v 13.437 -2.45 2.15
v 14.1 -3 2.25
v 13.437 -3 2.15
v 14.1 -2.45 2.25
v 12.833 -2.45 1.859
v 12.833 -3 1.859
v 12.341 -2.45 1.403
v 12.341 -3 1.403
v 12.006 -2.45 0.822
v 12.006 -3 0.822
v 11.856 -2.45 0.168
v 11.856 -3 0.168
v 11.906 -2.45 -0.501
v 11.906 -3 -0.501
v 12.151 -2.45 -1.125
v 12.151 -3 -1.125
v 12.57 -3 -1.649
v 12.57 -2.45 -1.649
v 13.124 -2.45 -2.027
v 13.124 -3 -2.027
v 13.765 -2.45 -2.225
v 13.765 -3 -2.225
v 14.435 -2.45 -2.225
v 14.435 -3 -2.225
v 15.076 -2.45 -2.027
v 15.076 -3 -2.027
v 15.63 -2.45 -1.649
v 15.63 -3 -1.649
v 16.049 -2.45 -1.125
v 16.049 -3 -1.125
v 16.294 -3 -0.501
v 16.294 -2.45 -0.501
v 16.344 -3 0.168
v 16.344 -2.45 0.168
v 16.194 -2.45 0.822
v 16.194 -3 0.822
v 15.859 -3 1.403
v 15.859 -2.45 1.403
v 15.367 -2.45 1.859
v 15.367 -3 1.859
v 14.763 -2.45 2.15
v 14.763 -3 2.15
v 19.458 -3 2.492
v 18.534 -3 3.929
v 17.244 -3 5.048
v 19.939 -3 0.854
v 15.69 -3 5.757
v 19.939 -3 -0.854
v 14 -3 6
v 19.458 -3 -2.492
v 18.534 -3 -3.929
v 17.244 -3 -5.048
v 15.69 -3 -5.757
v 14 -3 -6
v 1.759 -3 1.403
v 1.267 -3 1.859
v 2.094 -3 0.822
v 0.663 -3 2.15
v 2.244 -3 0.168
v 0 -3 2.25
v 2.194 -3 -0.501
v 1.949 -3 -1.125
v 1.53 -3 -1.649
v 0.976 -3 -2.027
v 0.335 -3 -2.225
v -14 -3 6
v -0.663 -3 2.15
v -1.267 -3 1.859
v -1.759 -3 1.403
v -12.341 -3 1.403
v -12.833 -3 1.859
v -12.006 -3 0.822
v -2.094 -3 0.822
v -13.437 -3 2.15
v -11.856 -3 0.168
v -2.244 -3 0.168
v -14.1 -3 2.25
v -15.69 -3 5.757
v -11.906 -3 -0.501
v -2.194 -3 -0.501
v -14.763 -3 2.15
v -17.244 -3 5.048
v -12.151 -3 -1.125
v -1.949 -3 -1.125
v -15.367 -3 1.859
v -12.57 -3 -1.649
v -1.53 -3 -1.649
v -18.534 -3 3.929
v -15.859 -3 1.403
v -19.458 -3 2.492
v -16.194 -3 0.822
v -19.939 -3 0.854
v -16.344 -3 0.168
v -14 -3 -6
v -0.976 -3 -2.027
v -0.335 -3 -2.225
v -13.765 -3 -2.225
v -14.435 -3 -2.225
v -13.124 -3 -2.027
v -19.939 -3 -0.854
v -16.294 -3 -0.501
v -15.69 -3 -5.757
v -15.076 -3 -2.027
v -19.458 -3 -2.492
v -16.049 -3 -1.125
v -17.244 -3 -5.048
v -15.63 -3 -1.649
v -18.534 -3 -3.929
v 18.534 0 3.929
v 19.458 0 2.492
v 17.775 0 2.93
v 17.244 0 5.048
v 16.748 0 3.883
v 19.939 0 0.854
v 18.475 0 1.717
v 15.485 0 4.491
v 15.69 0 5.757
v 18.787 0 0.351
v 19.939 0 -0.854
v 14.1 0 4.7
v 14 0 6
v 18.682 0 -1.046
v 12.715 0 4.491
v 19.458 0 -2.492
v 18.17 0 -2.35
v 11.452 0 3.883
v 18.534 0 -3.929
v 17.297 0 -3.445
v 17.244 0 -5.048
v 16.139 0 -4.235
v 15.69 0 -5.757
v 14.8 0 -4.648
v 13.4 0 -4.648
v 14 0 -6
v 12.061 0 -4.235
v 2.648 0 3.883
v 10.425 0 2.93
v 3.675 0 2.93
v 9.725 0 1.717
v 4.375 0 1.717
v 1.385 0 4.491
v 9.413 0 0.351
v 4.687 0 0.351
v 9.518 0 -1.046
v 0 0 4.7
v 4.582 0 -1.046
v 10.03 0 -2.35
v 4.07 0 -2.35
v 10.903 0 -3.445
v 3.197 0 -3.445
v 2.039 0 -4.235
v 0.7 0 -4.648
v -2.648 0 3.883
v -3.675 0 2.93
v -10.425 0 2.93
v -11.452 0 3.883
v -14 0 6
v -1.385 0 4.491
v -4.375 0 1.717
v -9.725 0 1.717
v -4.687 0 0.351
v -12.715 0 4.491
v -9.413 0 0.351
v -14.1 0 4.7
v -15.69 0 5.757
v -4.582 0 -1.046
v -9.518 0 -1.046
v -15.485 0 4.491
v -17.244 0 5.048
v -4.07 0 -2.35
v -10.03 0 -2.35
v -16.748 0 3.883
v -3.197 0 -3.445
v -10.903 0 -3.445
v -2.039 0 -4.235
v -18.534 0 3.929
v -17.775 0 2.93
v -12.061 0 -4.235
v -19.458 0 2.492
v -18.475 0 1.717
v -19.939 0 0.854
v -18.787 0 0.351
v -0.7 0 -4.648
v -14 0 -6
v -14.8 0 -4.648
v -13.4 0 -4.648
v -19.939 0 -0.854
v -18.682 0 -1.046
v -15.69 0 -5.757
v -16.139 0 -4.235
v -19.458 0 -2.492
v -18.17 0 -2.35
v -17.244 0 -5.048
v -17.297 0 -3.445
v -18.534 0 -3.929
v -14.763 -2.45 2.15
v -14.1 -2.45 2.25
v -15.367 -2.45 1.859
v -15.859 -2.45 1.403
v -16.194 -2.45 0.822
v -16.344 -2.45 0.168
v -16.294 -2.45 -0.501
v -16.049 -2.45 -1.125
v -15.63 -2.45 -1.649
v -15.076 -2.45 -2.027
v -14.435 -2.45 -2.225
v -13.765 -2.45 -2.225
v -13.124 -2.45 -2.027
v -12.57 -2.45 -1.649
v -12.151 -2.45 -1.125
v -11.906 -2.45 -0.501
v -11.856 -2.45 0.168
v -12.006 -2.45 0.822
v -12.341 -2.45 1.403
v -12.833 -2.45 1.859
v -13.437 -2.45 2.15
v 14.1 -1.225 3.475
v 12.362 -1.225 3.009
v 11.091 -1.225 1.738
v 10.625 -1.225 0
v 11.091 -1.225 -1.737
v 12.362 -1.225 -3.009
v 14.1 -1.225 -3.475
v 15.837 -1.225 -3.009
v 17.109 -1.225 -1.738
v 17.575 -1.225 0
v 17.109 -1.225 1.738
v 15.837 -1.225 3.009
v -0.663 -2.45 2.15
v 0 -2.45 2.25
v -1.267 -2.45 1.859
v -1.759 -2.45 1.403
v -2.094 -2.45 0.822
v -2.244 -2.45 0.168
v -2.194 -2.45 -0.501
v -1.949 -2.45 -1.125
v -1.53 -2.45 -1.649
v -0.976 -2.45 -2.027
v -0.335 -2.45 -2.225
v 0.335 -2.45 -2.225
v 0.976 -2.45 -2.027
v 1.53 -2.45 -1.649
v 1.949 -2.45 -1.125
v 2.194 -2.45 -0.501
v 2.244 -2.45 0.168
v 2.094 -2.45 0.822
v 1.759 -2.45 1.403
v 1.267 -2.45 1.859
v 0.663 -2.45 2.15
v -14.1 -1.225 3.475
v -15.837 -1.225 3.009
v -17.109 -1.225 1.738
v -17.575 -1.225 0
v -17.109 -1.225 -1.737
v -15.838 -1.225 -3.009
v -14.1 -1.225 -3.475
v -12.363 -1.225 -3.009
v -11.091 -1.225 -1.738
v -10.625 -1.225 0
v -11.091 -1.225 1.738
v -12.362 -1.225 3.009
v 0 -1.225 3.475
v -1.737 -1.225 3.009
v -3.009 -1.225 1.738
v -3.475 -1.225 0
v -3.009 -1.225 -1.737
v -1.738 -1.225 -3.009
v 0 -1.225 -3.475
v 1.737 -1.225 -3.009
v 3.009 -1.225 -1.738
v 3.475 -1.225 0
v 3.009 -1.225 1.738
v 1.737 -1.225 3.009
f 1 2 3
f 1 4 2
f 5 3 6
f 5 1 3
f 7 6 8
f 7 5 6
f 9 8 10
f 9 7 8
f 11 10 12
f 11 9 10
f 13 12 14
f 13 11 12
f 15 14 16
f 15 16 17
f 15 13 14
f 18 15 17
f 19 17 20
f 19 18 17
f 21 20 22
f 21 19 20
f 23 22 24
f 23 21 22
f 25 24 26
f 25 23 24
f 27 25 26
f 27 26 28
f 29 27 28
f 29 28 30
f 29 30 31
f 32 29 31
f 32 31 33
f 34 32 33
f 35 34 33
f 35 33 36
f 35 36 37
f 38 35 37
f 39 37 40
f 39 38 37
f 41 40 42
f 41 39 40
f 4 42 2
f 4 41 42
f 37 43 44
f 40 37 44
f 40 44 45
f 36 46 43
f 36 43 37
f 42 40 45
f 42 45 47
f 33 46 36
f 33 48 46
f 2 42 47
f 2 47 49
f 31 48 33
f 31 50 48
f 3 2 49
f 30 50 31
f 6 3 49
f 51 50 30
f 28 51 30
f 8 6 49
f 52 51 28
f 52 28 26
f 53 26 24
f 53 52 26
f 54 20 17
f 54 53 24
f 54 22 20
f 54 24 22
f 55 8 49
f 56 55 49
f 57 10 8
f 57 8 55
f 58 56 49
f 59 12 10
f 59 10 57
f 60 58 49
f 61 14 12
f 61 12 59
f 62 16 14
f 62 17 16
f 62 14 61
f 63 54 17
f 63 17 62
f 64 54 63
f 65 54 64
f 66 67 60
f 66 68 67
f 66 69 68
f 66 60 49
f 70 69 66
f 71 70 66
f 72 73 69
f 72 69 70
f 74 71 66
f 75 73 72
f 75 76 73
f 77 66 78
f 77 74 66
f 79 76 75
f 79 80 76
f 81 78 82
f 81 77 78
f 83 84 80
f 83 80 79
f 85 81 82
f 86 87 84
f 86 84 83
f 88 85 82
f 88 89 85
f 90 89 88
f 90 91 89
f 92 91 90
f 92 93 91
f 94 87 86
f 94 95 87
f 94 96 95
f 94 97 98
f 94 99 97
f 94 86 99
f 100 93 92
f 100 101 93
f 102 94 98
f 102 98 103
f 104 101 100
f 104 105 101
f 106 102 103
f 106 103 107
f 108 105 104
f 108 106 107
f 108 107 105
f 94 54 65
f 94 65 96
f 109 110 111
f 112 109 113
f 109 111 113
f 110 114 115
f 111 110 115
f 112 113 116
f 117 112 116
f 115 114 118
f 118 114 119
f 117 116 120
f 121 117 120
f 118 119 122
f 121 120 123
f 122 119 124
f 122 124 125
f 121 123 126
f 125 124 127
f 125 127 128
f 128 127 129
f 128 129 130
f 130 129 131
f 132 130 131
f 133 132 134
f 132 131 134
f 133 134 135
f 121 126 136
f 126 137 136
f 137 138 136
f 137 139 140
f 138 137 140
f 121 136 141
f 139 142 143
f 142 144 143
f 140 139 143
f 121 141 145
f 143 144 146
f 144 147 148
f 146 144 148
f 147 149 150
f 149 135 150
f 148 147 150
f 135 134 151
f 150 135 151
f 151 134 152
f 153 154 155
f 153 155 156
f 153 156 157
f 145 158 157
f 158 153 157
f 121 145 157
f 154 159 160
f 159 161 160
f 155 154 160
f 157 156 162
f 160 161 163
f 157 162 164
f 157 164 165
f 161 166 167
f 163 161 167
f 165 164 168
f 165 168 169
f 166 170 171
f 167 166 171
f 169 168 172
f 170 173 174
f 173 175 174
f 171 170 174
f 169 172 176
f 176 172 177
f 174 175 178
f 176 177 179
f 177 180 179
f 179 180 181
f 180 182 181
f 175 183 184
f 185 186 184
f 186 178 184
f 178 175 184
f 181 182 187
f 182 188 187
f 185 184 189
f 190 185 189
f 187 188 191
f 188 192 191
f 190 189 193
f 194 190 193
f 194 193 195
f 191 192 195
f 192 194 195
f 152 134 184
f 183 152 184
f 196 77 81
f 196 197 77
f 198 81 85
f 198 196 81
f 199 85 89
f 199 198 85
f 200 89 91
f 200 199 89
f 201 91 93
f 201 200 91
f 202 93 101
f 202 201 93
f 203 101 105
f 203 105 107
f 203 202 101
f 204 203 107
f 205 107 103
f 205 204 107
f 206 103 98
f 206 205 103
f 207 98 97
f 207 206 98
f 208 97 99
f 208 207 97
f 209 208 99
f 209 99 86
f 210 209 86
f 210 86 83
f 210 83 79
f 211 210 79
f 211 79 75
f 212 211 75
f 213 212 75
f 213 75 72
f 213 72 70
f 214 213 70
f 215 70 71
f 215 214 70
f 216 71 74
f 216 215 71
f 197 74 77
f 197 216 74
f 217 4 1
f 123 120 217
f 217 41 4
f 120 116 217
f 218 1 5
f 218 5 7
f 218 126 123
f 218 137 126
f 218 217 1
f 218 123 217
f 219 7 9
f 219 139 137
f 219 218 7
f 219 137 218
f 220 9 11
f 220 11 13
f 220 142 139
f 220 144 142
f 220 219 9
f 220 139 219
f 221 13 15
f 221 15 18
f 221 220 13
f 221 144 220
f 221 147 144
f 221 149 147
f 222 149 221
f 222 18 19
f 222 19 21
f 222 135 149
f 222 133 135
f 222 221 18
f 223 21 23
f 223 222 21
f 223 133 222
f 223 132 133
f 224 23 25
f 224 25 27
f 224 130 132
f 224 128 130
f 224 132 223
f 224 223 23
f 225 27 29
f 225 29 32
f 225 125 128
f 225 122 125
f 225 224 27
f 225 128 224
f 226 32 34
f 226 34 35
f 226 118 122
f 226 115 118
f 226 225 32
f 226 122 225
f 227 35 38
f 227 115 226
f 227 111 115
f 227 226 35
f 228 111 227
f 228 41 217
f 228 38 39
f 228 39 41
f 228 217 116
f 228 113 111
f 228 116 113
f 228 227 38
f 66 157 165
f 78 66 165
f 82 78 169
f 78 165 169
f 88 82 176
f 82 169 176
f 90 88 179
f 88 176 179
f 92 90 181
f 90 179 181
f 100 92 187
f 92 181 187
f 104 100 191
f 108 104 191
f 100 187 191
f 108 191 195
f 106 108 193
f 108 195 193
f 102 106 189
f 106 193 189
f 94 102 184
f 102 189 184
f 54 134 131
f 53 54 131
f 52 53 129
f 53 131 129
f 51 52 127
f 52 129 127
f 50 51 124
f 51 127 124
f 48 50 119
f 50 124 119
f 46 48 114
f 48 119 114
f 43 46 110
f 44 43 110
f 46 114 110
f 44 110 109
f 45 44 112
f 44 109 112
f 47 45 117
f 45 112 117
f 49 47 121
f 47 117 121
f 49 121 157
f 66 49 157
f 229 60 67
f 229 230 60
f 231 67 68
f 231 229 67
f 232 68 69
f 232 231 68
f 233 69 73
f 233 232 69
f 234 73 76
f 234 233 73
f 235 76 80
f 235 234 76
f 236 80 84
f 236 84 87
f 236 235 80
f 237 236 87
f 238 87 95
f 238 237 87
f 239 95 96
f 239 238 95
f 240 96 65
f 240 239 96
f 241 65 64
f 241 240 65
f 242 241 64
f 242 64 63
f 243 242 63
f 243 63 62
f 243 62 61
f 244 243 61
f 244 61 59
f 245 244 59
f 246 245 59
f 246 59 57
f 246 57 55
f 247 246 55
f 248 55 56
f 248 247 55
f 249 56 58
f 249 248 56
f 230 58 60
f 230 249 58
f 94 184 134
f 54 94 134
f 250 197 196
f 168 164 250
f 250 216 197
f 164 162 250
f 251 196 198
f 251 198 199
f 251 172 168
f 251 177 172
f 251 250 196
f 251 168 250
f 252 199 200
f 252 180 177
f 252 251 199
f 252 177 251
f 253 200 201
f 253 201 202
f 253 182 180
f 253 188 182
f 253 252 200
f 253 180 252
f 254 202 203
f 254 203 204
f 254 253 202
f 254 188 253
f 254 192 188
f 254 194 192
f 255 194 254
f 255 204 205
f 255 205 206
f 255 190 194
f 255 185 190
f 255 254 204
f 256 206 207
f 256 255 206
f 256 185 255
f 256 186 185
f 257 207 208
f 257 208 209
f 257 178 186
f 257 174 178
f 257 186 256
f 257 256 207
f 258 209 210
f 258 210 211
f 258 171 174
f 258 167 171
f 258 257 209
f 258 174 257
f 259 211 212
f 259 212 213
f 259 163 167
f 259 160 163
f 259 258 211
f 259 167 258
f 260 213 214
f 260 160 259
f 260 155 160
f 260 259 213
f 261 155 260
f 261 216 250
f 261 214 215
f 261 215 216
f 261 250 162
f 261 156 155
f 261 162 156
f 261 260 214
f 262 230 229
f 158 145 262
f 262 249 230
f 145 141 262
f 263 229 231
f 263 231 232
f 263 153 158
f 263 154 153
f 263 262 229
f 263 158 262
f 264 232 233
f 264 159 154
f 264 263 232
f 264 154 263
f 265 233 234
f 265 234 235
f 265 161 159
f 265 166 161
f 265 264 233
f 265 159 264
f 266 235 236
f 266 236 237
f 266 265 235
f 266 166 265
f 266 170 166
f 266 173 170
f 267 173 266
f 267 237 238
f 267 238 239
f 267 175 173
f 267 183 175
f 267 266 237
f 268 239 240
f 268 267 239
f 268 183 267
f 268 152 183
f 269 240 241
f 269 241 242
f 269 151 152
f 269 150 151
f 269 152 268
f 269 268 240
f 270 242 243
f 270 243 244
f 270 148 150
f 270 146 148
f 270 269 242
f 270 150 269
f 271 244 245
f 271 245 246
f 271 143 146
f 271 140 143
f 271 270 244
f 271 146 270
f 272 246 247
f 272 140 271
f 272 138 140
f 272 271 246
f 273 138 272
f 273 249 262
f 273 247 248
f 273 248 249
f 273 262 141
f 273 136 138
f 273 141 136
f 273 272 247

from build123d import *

# Parameters (mm, degrees)
BOSS_EXTRUDE1_DEPTH                            = 3
CSK_FOR_M4_FLAT_HEAD_MACHINE_SCREW7_AT_2_COUNT = 2
CSK_FOR_M4_FLAT_HEAD_MACHINE_SCREW7_AT_2_PITCH = 14.1
CSK_FOR_M4_FLAT_HEAD_MACHINE_SCREW7_AT_3_COUNT = 2
CSK_FOR_M4_FLAT_HEAD_MACHINE_SCREW7_AT_3_PITCH = 14.1


with BuildPart() as part:
    # Sketch2 → Boss-Extrude1 (new body)
    with BuildSketch(Plane(origin=(0, 0, 0), x_dir=(1, 0, 0), z_dir=(0, 1, 0))):
        with BuildLine():
            Line((14, -6), (-14, -6))
            ThreePointArc((-14, -6), (-20, 0), (-14, 6))
            Line((-14, 6), (14, 6))
            ThreePointArc((14, 6), (20, 0), (14, -6))
        make_face()
    extrude(amount=-BOSS_EXTRUDE1_DEPTH)

    # Sketch22 → CSK for M4 Flat Head Machine Screw7 (revolve, cut)
    with BuildSketch(Plane(origin=(0, 0, 0), x_dir=(0, 0, 1), z_dir=(1, 0, 0))):
        Polygon((0, 0), (0, 3), (2.25, 3), (2.25, 2.45), (4.7, 0), align=None)
    csk_for_m4_flat_head_machine_screw7 = revolve(axis=Axis((0, 6.35, 0), (0, -1, 0)), mode=Mode.SUBTRACT)

    # CSK for M4 Flat Head Machine Screw7 at 2: CSK for M4 Flat Head Machine Screw7 ×2
    with Locations(*[(-i * CSK_FOR_M4_FLAT_HEAD_MACHINE_SCREW7_AT_2_PITCH, 0, 0) for i in range(1, CSK_FOR_M4_FLAT_HEAD_MACHINE_SCREW7_AT_2_COUNT)]):
        add(csk_for_m4_flat_head_machine_screw7, mode=Mode.SUBTRACT)

    # CSK for M4 Flat Head Machine Screw7 at 3: CSK for M4 Flat Head Machine Screw7 ×2
    with Locations(*[(i * CSK_FOR_M4_FLAT_HEAD_MACHINE_SCREW7_AT_3_PITCH, 0, 0) for i in range(1, CSK_FOR_M4_FLAT_HEAD_MACHINE_SCREW7_AT_3_COUNT)]):
        add(csk_for_m4_flat_head_machine_screw7, mode=Mode.SUBTRACT)


solid = part.part
